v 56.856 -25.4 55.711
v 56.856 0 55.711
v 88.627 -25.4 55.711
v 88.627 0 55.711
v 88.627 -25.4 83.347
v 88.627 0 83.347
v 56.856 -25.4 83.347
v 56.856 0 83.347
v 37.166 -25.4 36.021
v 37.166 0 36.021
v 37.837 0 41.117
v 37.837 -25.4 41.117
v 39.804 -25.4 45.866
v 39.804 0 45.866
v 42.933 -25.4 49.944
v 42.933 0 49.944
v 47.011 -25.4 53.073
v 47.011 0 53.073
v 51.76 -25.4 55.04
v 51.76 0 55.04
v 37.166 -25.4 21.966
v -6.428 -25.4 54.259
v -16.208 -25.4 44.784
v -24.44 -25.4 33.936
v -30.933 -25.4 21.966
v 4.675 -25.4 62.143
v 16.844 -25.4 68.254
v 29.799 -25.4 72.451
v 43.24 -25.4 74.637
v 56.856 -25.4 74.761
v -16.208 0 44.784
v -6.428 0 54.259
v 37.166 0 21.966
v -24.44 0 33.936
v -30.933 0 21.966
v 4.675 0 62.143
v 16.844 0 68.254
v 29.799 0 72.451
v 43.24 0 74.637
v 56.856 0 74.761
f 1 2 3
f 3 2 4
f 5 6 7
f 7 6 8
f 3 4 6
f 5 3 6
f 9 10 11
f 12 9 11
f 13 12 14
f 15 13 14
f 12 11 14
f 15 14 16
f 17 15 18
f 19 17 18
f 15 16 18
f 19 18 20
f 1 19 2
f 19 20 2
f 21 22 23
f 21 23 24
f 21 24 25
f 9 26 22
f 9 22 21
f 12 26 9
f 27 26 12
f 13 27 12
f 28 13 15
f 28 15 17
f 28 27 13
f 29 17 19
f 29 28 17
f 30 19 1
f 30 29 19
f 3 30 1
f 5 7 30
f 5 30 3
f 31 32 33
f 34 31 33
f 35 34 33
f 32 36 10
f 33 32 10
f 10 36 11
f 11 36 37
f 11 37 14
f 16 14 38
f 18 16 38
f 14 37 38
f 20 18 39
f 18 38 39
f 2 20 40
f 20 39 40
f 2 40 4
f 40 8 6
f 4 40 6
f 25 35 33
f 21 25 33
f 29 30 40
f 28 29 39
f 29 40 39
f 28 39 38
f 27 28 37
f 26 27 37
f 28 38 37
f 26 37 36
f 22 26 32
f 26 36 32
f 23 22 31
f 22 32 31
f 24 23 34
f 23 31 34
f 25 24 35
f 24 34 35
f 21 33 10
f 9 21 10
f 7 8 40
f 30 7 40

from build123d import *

# Parameters (mm, degrees)
F1_DEPTH = 25.4


with BuildPart() as f1:
    # F0 (on Front) → F1 (new body)
    with BuildSketch(Plane.XZ):
        Polygon((56.856412, 74.760954), (56.856412, 55.710954), (88.627096, 55.710954), (88.627096, 83.346918), (56.856412, 83.346918), align=None)
        with BuildLine():
            Line((-30.933438, 21.966385), (18.116245, 21.966385))
            Line((18.116245, 21.966385), (18.116245, 36.020787))
            ThreePointArc((18.116245, 36.020787), (29.462977, 63.414222), (56.856412, 74.760954))
            ThreePointArc((56.856412, 74.760954), (4.674775, 62.14329), (-30.933438, 21.966385))
        make_face()
        with BuildLine():
            Line((18.116245, 21.966385), (37.166245, 21.966385))
            Line((37.166245, 21.966385), (37.166245, 36.020787))
            ThreePointArc((37.166245, 36.020787), (42.933361, 49.943838), (56.856412, 55.710954))
            Line((56.856412, 55.710954), (56.856412, 74.760954))
            ThreePointArc((56.856412, 74.760954), (29.462977, 63.414222), (18.116245, 36.020787))
            Line((18.116245, 36.020787), (18.116245, 21.966385))
        make_face()
    extrude(amount=F1_DEPTH)


solid = f1.part
